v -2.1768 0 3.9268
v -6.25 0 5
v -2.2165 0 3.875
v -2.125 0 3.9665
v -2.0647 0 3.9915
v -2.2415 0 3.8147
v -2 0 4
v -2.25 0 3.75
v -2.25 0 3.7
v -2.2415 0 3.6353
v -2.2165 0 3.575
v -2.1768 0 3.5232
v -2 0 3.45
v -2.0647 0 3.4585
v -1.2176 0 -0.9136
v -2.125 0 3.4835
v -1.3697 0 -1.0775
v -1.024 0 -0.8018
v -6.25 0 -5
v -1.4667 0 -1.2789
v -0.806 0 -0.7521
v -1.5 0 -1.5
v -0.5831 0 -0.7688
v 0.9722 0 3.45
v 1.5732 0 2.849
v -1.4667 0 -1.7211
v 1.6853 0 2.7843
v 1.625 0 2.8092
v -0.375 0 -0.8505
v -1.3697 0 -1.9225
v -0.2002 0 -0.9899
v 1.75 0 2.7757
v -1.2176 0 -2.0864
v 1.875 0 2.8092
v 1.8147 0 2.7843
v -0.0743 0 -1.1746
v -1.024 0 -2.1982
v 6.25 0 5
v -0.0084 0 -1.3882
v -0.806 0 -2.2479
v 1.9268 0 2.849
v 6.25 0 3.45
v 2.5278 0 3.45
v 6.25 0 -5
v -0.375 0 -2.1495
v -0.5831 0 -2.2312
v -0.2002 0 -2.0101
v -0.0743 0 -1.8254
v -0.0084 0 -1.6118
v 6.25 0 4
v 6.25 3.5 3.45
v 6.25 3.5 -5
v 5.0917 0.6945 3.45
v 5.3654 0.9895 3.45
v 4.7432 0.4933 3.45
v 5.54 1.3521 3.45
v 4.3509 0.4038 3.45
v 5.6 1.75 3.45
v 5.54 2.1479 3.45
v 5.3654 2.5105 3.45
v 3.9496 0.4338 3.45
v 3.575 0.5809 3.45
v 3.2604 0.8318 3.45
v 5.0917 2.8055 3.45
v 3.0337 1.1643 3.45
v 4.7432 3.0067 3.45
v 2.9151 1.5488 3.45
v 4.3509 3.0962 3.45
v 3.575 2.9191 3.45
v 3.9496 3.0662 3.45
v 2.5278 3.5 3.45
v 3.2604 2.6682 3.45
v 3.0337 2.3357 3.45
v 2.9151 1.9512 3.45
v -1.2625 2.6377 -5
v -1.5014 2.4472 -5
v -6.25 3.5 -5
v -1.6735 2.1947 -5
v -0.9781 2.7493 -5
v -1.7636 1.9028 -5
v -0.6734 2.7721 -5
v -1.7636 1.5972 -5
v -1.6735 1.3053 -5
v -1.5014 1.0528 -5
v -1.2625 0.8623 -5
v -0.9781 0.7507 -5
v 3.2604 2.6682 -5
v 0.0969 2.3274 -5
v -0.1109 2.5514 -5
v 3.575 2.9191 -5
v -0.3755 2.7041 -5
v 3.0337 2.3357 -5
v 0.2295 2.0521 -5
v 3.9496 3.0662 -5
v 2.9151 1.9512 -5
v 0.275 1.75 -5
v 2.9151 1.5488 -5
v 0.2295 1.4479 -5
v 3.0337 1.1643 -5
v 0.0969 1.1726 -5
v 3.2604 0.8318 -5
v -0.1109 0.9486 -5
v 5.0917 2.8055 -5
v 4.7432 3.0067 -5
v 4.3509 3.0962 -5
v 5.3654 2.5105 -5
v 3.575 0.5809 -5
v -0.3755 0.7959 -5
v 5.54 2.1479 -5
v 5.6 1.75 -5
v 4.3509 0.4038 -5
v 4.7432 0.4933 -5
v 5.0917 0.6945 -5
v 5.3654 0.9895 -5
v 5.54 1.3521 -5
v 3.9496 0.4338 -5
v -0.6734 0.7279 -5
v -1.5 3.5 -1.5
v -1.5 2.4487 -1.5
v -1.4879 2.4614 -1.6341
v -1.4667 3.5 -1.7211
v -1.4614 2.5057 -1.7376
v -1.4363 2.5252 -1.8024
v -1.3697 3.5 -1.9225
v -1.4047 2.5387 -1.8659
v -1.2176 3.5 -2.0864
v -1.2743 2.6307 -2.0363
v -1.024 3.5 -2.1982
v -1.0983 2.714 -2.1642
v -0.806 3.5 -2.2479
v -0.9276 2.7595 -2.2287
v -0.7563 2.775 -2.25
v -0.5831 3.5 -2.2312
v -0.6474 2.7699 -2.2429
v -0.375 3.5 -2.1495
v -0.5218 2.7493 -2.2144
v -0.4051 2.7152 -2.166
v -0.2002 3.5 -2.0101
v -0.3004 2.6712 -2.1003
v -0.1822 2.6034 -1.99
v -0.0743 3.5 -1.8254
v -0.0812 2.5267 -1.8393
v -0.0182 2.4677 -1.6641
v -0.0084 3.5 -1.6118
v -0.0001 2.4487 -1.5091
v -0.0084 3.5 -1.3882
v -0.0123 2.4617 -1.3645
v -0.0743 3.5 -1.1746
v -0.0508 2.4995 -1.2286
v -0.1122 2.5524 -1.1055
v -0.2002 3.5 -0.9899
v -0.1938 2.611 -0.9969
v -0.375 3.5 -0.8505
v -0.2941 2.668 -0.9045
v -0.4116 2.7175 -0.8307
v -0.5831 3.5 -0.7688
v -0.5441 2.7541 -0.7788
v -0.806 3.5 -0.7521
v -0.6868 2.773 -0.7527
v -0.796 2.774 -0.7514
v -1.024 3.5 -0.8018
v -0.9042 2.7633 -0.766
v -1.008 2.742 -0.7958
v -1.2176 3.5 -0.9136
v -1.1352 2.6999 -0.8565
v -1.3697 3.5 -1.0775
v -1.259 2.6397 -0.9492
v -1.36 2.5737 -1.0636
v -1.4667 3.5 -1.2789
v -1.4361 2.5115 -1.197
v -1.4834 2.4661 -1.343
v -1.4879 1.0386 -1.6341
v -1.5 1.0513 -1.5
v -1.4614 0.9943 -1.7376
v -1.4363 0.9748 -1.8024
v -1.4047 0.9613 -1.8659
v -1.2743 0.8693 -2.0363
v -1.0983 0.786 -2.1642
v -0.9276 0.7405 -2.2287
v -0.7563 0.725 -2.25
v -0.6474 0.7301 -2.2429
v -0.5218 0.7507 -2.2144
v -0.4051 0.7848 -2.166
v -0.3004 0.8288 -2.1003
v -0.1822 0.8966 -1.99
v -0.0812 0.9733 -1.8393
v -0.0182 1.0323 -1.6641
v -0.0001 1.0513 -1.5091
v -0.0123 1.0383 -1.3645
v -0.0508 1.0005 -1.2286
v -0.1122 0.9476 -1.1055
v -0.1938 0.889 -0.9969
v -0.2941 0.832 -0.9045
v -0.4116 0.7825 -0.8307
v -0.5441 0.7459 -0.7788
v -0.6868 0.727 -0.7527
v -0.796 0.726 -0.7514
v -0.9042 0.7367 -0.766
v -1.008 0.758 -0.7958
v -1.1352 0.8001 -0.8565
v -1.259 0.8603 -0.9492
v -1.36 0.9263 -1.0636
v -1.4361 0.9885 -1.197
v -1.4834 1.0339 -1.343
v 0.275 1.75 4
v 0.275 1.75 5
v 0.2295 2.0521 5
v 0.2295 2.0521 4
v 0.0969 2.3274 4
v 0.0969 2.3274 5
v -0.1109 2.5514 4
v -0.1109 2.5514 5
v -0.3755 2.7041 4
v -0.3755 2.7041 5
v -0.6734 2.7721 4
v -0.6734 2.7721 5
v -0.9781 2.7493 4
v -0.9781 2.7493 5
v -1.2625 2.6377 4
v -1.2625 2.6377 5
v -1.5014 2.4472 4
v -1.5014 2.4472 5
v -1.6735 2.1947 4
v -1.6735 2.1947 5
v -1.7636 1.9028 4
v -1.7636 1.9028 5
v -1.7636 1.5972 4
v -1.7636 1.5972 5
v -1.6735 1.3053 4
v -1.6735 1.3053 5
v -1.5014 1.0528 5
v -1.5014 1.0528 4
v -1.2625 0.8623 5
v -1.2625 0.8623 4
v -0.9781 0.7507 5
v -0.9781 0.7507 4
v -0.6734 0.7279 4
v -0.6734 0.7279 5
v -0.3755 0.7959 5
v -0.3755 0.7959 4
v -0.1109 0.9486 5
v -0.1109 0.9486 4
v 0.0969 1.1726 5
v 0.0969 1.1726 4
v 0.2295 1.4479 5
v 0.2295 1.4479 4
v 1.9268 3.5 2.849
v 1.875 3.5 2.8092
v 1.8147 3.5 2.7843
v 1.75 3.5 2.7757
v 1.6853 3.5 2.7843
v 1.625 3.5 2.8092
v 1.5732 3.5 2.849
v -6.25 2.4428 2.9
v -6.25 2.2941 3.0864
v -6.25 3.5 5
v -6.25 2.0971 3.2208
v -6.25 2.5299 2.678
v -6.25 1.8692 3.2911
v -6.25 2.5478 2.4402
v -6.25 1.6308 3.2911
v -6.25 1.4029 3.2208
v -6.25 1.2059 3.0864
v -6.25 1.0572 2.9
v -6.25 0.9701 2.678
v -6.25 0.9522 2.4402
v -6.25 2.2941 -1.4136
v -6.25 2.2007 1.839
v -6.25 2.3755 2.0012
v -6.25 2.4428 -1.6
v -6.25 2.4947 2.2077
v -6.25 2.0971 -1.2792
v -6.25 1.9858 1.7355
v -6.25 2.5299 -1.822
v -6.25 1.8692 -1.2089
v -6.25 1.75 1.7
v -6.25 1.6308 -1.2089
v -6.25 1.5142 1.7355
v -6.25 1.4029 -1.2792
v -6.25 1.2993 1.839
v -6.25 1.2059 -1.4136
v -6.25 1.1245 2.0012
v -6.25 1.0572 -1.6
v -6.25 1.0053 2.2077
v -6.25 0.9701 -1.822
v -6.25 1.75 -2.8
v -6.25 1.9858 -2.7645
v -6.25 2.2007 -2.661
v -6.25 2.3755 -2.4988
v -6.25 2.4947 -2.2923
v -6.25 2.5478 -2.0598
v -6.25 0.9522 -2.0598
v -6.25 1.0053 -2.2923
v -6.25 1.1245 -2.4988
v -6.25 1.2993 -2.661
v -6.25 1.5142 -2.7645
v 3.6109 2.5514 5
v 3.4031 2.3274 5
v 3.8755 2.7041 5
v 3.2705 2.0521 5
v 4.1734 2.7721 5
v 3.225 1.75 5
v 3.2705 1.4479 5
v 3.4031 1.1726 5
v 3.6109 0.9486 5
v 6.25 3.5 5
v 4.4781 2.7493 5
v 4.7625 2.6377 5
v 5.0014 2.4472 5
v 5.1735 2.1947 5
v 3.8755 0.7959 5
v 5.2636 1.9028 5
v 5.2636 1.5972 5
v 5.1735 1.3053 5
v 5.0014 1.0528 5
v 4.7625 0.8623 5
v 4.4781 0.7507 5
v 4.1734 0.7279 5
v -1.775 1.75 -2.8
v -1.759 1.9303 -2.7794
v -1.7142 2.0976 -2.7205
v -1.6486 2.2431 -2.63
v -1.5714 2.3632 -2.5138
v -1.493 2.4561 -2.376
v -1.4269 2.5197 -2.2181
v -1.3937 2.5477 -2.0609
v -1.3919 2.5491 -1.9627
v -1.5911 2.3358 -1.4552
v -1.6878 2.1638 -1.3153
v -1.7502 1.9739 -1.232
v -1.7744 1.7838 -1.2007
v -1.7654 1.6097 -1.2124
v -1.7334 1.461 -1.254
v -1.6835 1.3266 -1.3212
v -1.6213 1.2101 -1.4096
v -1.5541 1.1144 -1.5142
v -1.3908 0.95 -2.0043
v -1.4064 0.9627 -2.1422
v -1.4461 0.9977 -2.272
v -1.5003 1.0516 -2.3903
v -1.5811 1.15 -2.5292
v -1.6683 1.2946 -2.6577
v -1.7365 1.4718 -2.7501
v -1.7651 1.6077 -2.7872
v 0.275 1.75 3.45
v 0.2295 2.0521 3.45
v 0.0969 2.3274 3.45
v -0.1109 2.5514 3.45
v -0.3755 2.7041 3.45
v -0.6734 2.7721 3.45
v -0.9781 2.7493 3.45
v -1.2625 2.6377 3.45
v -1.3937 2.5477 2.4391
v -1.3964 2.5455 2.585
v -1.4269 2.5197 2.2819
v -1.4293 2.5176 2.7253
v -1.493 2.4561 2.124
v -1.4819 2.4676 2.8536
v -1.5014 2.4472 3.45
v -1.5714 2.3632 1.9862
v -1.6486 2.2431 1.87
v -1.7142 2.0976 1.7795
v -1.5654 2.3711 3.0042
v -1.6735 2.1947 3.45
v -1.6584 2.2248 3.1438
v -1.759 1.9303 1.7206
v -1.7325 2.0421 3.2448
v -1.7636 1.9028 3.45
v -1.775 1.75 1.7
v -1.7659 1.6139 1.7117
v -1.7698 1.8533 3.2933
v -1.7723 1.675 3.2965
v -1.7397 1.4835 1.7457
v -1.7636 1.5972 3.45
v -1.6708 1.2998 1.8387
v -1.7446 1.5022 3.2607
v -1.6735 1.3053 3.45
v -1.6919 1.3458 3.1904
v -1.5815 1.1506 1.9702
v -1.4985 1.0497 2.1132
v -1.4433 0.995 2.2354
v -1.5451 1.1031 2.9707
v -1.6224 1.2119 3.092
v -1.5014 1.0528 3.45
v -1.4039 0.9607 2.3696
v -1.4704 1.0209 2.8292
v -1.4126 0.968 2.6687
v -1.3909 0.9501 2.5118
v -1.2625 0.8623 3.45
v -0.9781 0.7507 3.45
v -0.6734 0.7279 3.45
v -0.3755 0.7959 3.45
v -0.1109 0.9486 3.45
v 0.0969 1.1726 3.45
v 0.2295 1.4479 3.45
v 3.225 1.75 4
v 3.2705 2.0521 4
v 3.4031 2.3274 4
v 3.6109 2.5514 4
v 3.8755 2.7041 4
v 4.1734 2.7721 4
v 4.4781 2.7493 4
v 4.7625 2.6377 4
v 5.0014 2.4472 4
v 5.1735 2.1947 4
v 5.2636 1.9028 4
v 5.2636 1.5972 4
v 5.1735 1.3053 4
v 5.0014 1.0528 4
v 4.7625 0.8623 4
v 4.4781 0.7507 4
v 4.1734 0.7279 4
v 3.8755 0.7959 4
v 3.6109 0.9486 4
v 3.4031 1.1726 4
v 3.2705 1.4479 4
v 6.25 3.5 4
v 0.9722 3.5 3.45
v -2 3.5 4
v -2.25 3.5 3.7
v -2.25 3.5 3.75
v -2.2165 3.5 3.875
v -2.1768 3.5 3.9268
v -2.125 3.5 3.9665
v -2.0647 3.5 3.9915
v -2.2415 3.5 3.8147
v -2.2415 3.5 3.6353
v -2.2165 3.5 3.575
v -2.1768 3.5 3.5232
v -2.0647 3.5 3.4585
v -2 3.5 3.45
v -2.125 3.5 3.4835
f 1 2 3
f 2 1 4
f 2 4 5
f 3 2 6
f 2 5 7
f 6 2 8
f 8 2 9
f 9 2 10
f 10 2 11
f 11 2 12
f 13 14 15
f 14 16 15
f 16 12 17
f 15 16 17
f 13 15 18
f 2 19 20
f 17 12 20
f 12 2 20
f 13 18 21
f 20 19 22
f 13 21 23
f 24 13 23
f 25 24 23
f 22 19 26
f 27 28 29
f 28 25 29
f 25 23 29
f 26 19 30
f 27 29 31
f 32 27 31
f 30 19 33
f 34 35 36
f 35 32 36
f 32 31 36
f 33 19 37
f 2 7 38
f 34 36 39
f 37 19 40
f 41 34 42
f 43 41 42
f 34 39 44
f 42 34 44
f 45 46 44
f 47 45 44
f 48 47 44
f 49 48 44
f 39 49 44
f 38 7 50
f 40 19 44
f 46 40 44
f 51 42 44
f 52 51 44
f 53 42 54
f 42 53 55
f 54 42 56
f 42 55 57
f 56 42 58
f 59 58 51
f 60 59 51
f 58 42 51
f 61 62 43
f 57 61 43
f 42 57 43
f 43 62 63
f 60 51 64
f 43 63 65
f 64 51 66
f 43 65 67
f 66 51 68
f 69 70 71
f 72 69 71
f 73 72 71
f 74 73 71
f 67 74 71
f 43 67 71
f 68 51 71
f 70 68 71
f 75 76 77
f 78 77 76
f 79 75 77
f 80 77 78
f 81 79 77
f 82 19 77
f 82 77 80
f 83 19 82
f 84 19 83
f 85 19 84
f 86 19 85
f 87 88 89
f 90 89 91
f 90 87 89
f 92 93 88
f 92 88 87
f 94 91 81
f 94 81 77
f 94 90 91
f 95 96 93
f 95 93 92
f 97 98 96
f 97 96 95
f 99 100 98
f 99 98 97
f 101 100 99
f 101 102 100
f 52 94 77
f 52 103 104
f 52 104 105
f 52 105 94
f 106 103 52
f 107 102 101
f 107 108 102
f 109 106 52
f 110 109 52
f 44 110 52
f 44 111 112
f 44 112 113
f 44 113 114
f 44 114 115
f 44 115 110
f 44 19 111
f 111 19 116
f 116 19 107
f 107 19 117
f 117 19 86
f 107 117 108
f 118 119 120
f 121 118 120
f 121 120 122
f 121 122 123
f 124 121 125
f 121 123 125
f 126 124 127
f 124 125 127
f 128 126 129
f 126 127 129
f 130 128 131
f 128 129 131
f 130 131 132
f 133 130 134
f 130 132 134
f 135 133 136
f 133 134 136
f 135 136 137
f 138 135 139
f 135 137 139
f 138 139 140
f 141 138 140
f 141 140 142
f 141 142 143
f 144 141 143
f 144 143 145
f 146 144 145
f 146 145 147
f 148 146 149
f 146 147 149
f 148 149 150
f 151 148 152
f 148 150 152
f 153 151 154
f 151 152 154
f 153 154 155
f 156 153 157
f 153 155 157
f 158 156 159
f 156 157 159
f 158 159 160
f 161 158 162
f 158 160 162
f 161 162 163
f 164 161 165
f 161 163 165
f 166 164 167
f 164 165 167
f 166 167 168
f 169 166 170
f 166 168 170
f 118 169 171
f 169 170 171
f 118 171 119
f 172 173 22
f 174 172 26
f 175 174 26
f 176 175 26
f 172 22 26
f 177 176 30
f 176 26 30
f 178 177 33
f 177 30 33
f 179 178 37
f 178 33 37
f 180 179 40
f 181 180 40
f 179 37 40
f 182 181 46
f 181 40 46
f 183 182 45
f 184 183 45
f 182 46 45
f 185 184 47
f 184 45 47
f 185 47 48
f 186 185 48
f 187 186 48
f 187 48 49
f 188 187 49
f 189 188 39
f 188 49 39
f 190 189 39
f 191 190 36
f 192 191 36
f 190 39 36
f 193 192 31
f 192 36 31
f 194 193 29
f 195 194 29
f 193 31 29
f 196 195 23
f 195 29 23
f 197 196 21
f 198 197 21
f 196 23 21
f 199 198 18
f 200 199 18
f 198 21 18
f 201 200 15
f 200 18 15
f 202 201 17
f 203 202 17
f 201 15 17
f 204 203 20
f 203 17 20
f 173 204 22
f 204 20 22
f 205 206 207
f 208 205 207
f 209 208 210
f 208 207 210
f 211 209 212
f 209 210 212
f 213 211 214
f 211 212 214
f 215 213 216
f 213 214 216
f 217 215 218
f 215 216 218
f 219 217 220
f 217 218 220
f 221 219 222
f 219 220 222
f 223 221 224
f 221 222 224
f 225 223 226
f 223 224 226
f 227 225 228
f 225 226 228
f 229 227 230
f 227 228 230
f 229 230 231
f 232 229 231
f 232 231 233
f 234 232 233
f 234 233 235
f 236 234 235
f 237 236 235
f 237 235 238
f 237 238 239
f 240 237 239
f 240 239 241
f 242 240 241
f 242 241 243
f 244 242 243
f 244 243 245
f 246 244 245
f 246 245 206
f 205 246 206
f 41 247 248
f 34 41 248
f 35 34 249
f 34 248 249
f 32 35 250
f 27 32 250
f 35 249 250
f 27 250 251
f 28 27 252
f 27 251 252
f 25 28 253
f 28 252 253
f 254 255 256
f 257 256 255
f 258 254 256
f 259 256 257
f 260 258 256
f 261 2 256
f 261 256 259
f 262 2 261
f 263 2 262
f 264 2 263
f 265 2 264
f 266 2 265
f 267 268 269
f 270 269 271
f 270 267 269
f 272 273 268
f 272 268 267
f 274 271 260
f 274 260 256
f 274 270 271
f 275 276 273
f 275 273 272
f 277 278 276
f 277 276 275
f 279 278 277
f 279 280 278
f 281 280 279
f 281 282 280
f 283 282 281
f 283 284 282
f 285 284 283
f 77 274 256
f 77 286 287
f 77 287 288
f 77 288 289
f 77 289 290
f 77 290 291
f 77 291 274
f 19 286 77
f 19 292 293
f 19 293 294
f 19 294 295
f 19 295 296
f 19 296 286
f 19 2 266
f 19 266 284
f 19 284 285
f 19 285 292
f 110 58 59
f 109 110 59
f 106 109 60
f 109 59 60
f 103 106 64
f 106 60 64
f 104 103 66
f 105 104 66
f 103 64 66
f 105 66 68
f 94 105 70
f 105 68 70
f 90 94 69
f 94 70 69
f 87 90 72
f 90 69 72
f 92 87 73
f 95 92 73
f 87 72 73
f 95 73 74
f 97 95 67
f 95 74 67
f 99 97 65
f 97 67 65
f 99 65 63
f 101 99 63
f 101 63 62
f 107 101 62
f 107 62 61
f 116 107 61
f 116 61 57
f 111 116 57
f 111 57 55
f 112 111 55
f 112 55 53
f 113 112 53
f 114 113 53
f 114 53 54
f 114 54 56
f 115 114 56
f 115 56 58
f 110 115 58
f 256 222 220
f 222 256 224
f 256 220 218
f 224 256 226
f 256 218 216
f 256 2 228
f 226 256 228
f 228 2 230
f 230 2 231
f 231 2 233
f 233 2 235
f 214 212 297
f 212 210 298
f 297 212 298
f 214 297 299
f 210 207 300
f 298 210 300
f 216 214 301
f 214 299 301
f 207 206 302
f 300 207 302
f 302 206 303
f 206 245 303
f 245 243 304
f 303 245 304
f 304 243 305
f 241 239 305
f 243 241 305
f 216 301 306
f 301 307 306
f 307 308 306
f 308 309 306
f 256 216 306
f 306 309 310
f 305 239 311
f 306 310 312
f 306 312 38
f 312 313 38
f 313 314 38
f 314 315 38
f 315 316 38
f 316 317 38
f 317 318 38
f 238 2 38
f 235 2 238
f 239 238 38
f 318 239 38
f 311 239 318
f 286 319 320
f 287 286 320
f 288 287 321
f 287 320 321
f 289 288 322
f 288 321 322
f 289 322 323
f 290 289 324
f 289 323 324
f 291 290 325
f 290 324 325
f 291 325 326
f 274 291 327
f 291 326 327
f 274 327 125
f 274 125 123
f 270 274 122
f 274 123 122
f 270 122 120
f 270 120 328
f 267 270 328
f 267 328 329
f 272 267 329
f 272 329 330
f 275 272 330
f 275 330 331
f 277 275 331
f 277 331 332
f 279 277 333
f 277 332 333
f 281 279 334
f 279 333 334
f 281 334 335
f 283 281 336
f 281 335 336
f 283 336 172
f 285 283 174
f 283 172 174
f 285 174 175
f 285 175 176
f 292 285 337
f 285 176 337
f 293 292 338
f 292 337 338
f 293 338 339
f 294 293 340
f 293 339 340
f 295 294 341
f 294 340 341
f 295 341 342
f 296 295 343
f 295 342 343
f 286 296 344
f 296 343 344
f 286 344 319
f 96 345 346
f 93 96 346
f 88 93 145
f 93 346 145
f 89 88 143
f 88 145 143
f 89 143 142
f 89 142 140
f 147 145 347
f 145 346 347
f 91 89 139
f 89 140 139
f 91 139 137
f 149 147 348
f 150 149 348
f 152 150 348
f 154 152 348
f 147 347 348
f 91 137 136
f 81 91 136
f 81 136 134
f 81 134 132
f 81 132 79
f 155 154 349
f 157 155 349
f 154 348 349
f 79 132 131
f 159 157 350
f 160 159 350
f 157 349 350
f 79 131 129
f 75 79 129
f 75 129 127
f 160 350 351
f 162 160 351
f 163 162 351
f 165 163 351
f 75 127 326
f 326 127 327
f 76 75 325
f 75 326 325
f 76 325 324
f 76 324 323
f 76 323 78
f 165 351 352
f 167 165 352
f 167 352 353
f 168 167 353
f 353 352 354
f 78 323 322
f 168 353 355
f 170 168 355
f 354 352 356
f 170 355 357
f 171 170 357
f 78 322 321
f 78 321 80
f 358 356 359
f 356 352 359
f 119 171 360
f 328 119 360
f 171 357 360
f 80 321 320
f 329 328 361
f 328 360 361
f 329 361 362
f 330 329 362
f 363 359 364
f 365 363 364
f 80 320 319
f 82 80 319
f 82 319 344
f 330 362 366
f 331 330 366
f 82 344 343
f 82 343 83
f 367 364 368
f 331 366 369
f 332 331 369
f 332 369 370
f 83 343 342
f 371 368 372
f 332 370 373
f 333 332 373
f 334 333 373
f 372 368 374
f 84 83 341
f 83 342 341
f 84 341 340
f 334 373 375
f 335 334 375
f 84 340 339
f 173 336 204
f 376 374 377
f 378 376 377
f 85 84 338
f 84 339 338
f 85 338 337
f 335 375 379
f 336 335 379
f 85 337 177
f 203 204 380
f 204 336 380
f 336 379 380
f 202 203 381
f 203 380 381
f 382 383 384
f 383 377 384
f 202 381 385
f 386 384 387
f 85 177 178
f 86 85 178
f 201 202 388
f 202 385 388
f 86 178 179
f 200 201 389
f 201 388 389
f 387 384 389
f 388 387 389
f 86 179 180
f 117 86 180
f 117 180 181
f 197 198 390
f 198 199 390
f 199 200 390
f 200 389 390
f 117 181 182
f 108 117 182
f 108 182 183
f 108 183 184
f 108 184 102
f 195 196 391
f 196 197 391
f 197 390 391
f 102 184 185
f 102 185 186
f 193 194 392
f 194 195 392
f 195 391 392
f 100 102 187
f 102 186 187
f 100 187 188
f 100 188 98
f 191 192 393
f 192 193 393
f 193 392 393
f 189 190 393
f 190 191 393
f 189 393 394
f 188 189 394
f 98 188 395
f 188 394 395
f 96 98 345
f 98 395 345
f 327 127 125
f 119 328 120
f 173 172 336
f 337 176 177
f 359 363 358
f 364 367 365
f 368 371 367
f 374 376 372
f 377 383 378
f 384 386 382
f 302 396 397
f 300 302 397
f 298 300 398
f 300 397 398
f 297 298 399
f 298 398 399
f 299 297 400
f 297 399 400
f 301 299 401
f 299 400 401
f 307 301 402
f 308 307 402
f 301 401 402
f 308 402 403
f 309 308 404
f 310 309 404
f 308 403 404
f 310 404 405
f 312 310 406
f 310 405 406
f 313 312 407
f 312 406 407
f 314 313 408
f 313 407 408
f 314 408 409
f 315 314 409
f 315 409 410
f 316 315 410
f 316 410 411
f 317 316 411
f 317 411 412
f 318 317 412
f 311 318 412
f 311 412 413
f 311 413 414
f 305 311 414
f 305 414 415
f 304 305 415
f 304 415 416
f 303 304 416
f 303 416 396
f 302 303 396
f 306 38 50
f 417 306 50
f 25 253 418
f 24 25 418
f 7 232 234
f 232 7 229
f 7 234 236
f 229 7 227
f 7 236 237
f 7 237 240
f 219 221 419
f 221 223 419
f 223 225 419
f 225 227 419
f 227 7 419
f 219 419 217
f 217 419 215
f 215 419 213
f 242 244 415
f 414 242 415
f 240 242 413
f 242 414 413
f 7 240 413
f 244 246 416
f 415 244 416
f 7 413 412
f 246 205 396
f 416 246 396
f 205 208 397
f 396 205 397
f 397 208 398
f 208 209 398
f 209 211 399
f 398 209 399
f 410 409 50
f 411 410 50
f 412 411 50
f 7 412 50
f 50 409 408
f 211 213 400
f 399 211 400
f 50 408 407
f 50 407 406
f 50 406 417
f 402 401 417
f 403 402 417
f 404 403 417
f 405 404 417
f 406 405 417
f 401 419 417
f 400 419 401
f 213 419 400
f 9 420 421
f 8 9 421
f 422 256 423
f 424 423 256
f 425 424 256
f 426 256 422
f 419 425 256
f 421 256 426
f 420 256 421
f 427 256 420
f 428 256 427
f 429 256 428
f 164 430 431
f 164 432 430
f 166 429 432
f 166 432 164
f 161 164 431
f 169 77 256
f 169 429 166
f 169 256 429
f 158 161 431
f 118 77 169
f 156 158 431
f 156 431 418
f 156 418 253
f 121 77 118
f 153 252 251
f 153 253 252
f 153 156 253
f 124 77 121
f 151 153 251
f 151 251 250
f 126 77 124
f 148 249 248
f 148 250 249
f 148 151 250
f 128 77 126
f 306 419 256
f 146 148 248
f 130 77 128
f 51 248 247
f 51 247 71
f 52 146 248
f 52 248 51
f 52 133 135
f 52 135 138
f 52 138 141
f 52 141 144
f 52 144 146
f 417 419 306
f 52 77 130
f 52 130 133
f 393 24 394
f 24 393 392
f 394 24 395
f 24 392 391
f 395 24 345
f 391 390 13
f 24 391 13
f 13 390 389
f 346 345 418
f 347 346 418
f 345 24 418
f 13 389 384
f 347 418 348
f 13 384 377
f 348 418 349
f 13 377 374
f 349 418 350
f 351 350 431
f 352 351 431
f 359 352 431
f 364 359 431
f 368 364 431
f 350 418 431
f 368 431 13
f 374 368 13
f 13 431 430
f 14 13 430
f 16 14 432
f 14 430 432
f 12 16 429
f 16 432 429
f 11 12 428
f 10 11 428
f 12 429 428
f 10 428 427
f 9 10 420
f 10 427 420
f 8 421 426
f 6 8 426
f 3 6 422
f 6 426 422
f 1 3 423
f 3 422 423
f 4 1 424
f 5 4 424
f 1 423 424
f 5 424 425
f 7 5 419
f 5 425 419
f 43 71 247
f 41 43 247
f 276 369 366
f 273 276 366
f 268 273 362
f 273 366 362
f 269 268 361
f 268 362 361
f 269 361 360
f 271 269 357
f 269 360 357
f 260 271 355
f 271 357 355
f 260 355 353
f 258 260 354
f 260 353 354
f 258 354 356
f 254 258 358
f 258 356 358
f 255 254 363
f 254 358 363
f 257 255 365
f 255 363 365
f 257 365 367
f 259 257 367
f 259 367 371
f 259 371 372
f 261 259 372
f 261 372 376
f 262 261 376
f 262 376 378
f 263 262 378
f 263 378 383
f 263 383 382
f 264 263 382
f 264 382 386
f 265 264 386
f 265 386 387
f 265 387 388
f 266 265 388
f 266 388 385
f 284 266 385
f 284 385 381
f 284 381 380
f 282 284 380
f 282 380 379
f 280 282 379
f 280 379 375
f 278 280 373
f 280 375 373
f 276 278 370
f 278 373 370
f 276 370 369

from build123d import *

# Parameters (mm, degrees)
SKETCH1_W                      = 12.5
SKETCH1_H                      = 10
BOSS_EXTRUDE1_DEPTH            = 3.5
CUT_EXTRUDE1_DEPTH             = 3.5
M2_5_CLEARANCE_HOLE1_D         = 2.7
M2_5_CLEARANCE_HOLE1_DEPTH     = 8.45
M2_5_TAPPED_HOLE1_D            = 2.05
M2_5_TAPPED_HOLE1_DEPTH        = 1
F_1_5_1_5_DIAMETER_HOLE1_D     = 1.5
F_1_5_1_5_DIAMETER_HOLE1_DEPTH = 3.5
M2_5_TAPPED_HOLE2_D            = 2.05
M2_TAPPED_HOLE3_D              = 1.6
M2_TAPPED_HOLE3_DEPTH          = 5
M2_TAPPED_HOLE3_TIP            = 0.480688495


with BuildPart() as part:
    # Sketch1 → Boss-Extrude1 (new body)
    with BuildSketch(Plane(origin=(0, 0, 0), x_dir=(1, 0, 0), z_dir=(0, 1, 0))):
        Rectangle(SKETCH1_W, SKETCH1_H)
    extrude(amount=BOSS_EXTRUDE1_DEPTH)

    # Sketch2 → Cut-Extrude1 (cut)
    with BuildSketch(Plane(origin=(0, 3.5, 0), x_dir=(1, 0, 0), z_dir=(0, 1, 0))):
        with BuildLine():
            Line((2.527817459, -3.45), (1.926776695, -2.848959236))
            ThreePointArc((1.926776695, -2.848959236), (1.75, -2.775735931), (1.573223305, -2.848959236))
            Line((1.573223305, -2.848959236), (0.972182541, -3.45))
            Line((0.972182541, -3.45), (-2, -3.45))
            ThreePointArc((-2, -3.45), (-2.176776695, -3.523223305), (-2.25, -3.7))
            Line((-2.25, -3.7), (-2.25, -3.75))
            ThreePointArc((-2.25, -3.75), (-2.176776695, -3.926776695), (-2, -4))
            Line((-2, -4), (6.25, -4))
            Line((6.25, -4), (6.25, -3.45))
            Line((6.25, -3.45), (2.527817459, -3.45))
        make_face()
    extrude(amount=-CUT_EXTRUDE1_DEPTH, mode=Mode.SUBTRACT)

    # M2.5 Clearance Hole1
    with Locations(Plane(origin=(0, 0, -5), x_dir=(-1, 0, 0), z_dir=(0, 0, -1))):
        with Locations((-4.25, 1.75)):
            Hole(M2_5_CLEARANCE_HOLE1_D / 2, depth=M2_5_CLEARANCE_HOLE1_DEPTH)

    # M2.5 Tapped Hole1
    with Locations(Plane.XY.offset(5)):
        with Locations((4.25, 1.75)):
            Hole(M2_5_TAPPED_HOLE1_D / 2, depth=M2_5_TAPPED_HOLE1_DEPTH)

    # Ø1.5 (1.5) Diameter Hole1
    with Locations(Plane(origin=(0, 3.5, 0), x_dir=(1, 0, 0), z_dir=(0, 1, 0))):
        with Locations((-0.75, 1.5)):
            Hole(F_1_5_1_5_DIAMETER_HOLE1_D / 2, depth=F_1_5_1_5_DIAMETER_HOLE1_DEPTH)

    # M2.5 Tapped Hole2 (through all)
    with Locations(Plane(origin=(0, 0, -5), x_dir=(-1, 0, 0), z_dir=(0, 0, -1))):
        with Locations((0.75, 1.75)):
            Hole(M2_5_TAPPED_HOLE2_D / 2)

    # M2 Tapped Hole3
    with Locations(Plane.ZY.offset(6.25)):
        with Locations((-2, 1.75), (2.5, 1.75)):
            Hole(M2_TAPPED_HOLE3_D / 2, depth=M2_TAPPED_HOLE3_DEPTH)
            with Locations((0, 0, -(M2_TAPPED_HOLE3_DEPTH + M2_TAPPED_HOLE3_TIP / 2))):  # 118° drill point
                Cone(0, M2_TAPPED_HOLE3_D / 2, M2_TAPPED_HOLE3_TIP, mode=Mode.SUBTRACT)


solid = part.part
